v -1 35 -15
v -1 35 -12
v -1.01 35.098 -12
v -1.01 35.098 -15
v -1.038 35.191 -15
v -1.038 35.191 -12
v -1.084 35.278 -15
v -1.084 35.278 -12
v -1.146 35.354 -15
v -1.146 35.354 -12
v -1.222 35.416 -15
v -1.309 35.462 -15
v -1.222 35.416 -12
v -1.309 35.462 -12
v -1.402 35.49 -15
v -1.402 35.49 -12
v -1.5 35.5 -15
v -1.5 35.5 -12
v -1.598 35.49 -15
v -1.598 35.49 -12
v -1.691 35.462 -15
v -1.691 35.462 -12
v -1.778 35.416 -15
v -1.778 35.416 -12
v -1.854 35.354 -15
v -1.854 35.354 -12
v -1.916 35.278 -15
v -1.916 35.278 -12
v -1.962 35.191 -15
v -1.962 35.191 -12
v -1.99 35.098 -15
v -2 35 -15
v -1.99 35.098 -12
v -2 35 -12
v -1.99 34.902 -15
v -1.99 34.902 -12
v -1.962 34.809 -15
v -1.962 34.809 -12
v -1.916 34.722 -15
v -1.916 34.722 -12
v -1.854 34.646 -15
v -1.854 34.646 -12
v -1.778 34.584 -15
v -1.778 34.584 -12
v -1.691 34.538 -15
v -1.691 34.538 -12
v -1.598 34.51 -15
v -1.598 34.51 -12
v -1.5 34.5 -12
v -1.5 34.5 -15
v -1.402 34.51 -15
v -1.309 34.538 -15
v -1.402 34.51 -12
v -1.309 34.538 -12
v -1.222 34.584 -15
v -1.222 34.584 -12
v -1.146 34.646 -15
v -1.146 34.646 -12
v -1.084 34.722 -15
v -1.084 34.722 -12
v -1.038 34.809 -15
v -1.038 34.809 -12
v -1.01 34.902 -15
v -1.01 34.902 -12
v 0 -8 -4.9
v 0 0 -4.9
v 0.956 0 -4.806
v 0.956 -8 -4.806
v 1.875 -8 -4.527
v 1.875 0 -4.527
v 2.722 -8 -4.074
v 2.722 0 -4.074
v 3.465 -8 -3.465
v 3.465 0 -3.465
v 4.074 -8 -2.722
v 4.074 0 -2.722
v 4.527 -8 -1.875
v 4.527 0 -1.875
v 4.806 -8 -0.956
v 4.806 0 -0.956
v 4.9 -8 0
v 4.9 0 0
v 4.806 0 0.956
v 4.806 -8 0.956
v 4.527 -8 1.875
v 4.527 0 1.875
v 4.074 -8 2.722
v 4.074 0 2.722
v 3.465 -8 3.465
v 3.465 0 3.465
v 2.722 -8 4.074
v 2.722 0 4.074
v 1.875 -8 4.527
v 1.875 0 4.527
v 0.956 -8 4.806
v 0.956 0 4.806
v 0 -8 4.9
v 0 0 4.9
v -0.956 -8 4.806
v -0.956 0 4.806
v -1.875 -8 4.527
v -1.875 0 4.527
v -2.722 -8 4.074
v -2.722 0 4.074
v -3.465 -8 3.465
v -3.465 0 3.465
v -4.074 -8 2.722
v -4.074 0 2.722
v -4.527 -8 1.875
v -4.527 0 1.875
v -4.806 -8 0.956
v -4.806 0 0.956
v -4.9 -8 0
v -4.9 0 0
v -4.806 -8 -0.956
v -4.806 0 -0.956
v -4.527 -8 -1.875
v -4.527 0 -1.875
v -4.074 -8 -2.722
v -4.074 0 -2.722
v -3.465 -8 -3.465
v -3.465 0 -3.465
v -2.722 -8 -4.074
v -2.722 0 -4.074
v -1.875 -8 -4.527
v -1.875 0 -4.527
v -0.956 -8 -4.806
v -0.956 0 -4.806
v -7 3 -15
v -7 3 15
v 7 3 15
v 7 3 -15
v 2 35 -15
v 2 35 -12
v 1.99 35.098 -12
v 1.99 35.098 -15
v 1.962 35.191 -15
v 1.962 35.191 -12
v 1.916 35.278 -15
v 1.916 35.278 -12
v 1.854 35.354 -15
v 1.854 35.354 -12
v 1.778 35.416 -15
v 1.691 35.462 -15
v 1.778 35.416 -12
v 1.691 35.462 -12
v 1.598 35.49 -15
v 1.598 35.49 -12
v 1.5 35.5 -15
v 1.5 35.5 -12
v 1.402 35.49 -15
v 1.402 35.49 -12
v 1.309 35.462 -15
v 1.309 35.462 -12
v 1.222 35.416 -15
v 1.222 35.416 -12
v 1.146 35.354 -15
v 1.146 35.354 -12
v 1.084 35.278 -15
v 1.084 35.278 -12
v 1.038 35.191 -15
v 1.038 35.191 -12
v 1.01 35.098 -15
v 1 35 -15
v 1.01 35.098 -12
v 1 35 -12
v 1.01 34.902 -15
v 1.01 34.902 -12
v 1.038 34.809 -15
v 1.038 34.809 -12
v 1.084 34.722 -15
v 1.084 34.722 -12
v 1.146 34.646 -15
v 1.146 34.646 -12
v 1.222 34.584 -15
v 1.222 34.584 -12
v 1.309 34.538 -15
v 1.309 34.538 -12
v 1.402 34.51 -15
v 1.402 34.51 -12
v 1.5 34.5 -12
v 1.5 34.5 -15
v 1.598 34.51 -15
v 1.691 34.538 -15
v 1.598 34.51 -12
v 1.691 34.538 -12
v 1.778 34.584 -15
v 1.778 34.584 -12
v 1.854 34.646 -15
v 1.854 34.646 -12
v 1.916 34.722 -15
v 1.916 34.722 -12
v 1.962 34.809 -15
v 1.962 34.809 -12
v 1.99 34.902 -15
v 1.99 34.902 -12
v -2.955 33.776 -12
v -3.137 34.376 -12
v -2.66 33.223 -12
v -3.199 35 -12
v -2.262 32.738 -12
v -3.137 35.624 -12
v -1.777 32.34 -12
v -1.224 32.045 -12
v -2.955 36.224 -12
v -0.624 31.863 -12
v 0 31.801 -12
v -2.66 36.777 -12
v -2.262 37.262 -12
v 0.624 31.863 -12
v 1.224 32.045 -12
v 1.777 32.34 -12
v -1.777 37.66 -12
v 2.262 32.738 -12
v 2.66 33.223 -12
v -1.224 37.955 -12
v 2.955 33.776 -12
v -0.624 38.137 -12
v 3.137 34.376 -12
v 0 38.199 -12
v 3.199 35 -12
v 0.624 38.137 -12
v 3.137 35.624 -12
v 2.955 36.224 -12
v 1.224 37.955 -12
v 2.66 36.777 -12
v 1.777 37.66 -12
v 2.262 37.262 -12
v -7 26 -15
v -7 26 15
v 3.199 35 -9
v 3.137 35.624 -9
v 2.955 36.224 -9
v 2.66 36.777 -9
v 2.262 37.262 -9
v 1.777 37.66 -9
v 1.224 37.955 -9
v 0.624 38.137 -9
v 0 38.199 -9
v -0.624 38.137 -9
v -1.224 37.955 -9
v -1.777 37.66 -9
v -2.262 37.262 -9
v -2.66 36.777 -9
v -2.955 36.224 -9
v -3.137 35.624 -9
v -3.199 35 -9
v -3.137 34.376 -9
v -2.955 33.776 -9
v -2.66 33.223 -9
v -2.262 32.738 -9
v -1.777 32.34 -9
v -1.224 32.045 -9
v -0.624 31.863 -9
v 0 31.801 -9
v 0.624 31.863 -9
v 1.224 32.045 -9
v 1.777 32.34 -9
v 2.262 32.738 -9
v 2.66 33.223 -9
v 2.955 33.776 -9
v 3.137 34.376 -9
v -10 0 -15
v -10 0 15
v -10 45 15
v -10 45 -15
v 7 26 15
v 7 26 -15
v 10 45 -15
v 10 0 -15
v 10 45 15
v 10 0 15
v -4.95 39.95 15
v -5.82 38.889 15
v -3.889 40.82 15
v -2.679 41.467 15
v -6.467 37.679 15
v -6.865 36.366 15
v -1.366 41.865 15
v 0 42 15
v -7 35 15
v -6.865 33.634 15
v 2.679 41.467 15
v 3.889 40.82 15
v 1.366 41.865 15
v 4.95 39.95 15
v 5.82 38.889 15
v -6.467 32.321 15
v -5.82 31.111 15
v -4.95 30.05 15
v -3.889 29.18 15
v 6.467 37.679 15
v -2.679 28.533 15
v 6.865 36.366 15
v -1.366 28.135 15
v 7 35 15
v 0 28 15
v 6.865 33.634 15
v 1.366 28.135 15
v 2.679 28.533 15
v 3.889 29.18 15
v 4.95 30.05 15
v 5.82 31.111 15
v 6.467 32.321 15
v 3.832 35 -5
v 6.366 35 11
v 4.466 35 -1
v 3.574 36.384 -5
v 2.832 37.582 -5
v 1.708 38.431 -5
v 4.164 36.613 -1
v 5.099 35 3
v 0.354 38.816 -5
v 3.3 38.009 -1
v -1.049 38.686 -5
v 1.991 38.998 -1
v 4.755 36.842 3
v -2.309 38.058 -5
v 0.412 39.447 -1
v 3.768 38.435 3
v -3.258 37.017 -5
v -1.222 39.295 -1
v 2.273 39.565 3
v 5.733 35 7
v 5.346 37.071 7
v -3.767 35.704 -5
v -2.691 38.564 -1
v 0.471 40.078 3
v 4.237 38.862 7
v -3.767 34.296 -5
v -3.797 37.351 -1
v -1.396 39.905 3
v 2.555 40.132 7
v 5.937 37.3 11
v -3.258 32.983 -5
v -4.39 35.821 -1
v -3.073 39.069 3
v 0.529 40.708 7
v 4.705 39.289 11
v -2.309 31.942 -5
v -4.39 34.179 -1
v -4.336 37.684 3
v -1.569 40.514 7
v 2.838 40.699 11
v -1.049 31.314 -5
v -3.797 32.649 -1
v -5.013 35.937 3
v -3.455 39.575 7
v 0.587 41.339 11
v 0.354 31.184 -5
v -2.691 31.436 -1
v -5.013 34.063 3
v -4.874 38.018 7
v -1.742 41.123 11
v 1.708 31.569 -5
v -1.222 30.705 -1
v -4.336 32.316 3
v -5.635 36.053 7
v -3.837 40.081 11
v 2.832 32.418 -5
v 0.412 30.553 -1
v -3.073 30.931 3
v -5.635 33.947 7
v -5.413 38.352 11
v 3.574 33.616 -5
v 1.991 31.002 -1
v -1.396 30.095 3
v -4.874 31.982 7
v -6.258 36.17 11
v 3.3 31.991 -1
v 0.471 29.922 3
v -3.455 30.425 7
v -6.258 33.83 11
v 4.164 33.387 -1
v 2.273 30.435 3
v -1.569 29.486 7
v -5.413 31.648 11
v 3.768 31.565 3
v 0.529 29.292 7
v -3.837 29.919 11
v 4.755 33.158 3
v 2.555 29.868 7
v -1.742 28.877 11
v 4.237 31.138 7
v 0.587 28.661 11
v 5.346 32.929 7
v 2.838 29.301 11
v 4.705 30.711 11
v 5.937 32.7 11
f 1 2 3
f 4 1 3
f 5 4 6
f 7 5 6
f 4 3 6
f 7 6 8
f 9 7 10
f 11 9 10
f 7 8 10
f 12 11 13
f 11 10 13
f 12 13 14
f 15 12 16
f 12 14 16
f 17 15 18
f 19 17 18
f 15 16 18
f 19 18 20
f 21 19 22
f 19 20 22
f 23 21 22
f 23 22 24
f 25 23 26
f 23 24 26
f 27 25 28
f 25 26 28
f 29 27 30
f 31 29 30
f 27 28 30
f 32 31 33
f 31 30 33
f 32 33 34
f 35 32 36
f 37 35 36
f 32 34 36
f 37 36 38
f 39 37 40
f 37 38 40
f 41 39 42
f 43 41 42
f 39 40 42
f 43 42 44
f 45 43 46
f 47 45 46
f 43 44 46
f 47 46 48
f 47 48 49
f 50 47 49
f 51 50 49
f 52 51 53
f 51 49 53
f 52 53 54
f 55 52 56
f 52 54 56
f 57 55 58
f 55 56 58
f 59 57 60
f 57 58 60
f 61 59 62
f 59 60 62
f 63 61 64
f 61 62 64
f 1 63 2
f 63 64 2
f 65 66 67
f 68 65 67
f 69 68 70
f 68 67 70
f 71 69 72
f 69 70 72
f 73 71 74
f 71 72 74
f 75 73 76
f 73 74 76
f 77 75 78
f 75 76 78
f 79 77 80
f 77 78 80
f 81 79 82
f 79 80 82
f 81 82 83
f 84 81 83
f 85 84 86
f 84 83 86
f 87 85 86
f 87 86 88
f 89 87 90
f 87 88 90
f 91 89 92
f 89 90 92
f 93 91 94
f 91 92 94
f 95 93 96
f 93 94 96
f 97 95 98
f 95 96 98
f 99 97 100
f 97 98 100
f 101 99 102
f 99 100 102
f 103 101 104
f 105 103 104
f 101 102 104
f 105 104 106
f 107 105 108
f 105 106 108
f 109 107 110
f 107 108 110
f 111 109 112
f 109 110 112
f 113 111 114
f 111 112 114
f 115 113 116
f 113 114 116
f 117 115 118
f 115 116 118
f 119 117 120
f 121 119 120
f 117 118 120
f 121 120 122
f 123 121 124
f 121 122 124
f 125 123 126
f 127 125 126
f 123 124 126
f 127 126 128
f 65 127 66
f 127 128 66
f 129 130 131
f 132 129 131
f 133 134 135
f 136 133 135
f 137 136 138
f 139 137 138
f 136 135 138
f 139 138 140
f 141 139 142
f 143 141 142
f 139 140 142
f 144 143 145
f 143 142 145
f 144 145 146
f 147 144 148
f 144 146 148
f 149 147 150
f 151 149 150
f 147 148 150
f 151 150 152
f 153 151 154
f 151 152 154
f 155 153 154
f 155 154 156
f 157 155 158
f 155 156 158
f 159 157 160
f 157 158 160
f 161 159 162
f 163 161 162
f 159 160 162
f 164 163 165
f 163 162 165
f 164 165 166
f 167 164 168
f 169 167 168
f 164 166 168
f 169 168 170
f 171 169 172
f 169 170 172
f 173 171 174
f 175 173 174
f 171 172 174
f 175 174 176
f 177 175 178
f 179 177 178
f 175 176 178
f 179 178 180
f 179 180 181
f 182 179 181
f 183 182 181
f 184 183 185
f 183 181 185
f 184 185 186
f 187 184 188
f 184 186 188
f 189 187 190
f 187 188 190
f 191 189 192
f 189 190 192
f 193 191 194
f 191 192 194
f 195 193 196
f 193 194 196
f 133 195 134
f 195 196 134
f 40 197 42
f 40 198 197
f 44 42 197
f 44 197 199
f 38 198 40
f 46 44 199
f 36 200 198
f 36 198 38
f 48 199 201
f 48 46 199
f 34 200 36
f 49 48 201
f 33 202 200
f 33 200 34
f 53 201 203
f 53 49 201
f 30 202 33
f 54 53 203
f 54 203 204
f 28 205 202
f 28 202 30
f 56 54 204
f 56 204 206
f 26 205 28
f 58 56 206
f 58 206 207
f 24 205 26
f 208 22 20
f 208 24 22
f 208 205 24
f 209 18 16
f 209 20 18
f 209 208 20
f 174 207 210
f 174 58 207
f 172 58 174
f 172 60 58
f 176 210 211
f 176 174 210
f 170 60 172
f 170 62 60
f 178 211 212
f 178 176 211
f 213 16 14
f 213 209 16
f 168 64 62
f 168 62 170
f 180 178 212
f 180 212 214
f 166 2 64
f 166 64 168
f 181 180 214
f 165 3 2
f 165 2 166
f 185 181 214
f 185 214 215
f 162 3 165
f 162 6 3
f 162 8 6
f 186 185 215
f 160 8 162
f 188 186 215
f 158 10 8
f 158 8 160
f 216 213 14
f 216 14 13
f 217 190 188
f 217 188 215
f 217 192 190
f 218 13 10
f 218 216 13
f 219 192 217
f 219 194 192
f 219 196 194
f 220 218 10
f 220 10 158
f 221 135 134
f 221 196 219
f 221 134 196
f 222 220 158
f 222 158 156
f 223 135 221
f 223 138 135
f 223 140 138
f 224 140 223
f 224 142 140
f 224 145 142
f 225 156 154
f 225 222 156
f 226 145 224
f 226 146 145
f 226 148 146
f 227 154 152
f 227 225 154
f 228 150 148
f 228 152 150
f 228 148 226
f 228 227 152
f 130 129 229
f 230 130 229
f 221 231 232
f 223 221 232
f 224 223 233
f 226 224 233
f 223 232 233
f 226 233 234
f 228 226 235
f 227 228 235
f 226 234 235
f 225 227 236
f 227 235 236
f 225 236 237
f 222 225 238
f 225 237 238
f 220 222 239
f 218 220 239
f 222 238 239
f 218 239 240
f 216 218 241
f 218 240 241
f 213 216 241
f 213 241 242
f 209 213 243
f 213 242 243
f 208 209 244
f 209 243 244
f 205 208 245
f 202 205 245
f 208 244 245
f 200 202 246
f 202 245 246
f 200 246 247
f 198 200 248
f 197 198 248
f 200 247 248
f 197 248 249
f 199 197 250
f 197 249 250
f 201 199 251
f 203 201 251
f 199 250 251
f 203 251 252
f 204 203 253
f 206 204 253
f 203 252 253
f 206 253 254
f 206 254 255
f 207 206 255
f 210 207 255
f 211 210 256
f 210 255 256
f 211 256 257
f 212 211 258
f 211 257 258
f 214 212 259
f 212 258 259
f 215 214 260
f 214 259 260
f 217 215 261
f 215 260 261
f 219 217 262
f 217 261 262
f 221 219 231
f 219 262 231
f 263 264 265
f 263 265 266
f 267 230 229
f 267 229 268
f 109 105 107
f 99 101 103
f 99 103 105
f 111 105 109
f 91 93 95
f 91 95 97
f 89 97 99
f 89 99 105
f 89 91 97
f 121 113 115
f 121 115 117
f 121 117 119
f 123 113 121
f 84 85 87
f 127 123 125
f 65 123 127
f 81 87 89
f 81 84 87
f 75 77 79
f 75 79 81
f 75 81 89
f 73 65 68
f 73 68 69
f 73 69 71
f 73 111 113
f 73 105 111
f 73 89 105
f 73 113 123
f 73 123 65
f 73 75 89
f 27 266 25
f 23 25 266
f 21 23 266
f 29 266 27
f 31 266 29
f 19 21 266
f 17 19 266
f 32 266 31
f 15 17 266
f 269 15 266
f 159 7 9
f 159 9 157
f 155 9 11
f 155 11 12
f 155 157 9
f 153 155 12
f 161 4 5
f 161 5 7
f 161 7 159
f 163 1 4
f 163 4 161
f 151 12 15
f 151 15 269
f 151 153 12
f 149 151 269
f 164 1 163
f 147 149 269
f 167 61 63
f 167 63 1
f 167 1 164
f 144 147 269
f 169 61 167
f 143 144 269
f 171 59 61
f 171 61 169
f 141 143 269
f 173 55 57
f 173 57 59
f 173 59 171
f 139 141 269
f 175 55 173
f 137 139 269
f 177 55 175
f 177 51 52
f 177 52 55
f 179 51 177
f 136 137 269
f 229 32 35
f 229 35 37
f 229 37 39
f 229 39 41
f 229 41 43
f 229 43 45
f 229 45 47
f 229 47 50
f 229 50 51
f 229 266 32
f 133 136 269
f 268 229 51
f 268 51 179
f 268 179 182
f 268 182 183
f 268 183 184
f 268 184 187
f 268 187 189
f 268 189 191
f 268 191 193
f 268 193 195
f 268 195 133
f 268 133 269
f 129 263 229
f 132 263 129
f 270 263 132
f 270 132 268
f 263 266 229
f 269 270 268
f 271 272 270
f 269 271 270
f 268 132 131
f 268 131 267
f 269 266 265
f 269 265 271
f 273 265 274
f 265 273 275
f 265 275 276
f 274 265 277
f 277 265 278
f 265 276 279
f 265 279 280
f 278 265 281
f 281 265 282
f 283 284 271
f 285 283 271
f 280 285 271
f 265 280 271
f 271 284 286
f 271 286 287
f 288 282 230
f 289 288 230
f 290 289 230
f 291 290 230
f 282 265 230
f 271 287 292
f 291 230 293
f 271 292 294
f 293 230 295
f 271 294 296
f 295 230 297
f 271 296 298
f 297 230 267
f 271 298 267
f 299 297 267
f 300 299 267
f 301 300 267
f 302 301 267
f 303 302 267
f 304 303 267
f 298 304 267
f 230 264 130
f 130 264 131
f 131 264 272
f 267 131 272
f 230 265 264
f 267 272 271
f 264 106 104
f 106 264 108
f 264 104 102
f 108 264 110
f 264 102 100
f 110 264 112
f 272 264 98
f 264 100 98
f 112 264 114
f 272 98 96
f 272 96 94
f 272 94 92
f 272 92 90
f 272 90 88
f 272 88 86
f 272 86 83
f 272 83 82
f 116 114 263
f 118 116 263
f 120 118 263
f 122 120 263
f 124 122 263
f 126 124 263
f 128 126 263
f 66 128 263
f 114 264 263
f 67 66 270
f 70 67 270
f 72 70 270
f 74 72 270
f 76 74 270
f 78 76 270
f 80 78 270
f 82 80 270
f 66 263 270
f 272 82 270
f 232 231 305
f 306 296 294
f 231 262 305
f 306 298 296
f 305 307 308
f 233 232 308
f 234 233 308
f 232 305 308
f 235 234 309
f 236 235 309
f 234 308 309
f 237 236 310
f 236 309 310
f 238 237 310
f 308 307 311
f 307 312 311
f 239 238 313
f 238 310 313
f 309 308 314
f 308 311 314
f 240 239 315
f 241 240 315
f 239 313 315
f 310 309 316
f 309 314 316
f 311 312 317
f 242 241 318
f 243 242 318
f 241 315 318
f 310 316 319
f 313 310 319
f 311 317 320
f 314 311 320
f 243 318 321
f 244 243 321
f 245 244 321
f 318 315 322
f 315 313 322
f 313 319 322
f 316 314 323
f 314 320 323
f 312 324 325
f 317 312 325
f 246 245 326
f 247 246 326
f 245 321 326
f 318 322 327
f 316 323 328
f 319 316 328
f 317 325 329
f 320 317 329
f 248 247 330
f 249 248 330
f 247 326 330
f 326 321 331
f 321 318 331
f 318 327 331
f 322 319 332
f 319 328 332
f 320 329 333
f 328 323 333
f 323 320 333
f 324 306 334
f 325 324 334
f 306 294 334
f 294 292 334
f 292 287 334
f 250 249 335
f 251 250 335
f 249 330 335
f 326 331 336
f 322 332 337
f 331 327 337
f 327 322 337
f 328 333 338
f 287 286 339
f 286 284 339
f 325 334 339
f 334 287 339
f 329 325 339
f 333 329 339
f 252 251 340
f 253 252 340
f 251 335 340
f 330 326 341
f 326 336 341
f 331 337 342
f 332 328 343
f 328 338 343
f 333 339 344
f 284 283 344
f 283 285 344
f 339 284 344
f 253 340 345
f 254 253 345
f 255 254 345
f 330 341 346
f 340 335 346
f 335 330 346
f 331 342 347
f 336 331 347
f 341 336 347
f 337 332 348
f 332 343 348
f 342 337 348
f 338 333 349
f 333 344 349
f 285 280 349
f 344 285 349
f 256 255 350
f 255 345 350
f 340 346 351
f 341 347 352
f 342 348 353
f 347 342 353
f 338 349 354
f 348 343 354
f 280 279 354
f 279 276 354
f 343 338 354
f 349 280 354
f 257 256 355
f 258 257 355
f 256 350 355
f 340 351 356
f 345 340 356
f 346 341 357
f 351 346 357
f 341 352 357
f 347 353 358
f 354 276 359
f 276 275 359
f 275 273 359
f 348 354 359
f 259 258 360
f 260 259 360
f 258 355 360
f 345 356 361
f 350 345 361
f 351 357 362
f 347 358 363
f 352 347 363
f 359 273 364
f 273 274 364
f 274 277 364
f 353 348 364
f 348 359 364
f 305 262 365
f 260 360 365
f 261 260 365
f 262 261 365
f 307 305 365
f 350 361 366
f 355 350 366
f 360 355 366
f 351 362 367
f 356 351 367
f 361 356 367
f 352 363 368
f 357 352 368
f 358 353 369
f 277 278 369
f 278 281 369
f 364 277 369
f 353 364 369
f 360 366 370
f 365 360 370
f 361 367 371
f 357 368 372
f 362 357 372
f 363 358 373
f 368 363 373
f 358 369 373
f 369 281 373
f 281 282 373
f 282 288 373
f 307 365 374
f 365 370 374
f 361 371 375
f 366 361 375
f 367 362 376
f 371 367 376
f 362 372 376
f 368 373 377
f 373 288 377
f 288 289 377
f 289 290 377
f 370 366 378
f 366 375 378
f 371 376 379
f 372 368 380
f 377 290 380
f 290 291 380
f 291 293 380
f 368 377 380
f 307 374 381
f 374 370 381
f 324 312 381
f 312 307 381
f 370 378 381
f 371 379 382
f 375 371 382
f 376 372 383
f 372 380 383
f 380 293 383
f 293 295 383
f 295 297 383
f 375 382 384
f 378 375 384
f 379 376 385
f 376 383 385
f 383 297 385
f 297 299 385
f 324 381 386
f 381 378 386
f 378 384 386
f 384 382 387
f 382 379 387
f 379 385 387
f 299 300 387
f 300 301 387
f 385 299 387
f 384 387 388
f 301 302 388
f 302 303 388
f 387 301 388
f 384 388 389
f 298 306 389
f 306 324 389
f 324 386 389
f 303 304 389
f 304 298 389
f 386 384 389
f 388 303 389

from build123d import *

# Parameters (mm, degrees)
SKETCH1_W           = 20
SKETCH1_H           = 30
BOSS_EXTRUDE1_DEPTH = 45
SKETCH2_R           = 4.9
BOSS_EXTRUDE2_DEPTH = 8
SKETCH3_R           = 7
CUT_EXTRUDE1_DEPTH  = 24
CUT_EXTRUDE1_DRAFT  = -9
SKETCH4_R           = 3.198773432
CUT_EXTRUDE2_DEPTH  = 3
SKETCH5_R           = 0.5
CUT_EXTRUDE3_DEPTH  = 3
SKETCH6_W           = 14
SKETCH6_H           = 23
CUT_EXTRUDE4_DEPTH  = 56


with BuildPart() as part:
    # Sketch1 → Boss-Extrude1 (new body)
    with BuildSketch(Plane(origin=(0, 0, 0), x_dir=(1, 0, 0), z_dir=(0, 1, 0))):
        Rectangle(SKETCH1_W, SKETCH1_H)
    extrude(amount=BOSS_EXTRUDE1_DEPTH)

    # Sketch2 → Boss-Extrude2 (add)
    with BuildSketch(Plane(origin=(0, 0, 0), x_dir=(-1, 0, 0), z_dir=(0, -1, 0))):
        with Locations(Location((0, 0, 0), (0, 0, 90))):
            Circle(SKETCH2_R)
    extrude(amount=BOSS_EXTRUDE2_DEPTH)


with BuildPart() as cut_extrude1_tool:
    # Sketch3 → Cut-Extrude1 (with draft: the straight prism first)
    with BuildSketch(Plane.XY.offset(15)):
        with Locations((0, 35)):
            Circle(SKETCH3_R)
    extrude(amount=-CUT_EXTRUDE1_DEPTH)
    # Cut-Extrude1: the draft: its side faces are tilted about the plane it starts from
    cut_extrude1_sides = [cut_extrude1_tool.faces().sort_by_distance(p)[0] for p in [
        (-7, 35, 3),
    ]]
    draft(cut_extrude1_sides, Plane.XY.offset(15), CUT_EXTRUDE1_DRAFT)


with BuildPart() as part_1:
    add(part.part)

    # Cut-Extrude1: cut by cut_extrude1_tool
    add(cut_extrude1_tool.part, mode=Mode.SUBTRACT)

    # Sketch4 → Cut-Extrude2 (cut)
    with BuildSketch(Plane.XY.offset(-9)):
        with Locations((0, 35)):
            Circle(SKETCH4_R)
    extrude(amount=-CUT_EXTRUDE2_DEPTH, mode=Mode.SUBTRACT)

    # Sketch5 → Cut-Extrude3 (cut)
    with BuildSketch(Plane.XY.offset(-12)):
        with Locations((-1.5, 35)):
            Circle(SKETCH5_R)
        with Locations((1.5, 35)):
            Circle(SKETCH5_R)
    extrude(amount=-CUT_EXTRUDE3_DEPTH, mode=Mode.SUBTRACT)

    # Sketch6 → Cut-Extrude4 (cut, through all)
    with BuildSketch(Plane.XY.offset(15)):
        with Locations((0, 14.5)):
            Rectangle(SKETCH6_W, SKETCH6_H)
    extrude(amount=-CUT_EXTRUDE4_DEPTH, mode=Mode.SUBTRACT)


solid = part_1.part
